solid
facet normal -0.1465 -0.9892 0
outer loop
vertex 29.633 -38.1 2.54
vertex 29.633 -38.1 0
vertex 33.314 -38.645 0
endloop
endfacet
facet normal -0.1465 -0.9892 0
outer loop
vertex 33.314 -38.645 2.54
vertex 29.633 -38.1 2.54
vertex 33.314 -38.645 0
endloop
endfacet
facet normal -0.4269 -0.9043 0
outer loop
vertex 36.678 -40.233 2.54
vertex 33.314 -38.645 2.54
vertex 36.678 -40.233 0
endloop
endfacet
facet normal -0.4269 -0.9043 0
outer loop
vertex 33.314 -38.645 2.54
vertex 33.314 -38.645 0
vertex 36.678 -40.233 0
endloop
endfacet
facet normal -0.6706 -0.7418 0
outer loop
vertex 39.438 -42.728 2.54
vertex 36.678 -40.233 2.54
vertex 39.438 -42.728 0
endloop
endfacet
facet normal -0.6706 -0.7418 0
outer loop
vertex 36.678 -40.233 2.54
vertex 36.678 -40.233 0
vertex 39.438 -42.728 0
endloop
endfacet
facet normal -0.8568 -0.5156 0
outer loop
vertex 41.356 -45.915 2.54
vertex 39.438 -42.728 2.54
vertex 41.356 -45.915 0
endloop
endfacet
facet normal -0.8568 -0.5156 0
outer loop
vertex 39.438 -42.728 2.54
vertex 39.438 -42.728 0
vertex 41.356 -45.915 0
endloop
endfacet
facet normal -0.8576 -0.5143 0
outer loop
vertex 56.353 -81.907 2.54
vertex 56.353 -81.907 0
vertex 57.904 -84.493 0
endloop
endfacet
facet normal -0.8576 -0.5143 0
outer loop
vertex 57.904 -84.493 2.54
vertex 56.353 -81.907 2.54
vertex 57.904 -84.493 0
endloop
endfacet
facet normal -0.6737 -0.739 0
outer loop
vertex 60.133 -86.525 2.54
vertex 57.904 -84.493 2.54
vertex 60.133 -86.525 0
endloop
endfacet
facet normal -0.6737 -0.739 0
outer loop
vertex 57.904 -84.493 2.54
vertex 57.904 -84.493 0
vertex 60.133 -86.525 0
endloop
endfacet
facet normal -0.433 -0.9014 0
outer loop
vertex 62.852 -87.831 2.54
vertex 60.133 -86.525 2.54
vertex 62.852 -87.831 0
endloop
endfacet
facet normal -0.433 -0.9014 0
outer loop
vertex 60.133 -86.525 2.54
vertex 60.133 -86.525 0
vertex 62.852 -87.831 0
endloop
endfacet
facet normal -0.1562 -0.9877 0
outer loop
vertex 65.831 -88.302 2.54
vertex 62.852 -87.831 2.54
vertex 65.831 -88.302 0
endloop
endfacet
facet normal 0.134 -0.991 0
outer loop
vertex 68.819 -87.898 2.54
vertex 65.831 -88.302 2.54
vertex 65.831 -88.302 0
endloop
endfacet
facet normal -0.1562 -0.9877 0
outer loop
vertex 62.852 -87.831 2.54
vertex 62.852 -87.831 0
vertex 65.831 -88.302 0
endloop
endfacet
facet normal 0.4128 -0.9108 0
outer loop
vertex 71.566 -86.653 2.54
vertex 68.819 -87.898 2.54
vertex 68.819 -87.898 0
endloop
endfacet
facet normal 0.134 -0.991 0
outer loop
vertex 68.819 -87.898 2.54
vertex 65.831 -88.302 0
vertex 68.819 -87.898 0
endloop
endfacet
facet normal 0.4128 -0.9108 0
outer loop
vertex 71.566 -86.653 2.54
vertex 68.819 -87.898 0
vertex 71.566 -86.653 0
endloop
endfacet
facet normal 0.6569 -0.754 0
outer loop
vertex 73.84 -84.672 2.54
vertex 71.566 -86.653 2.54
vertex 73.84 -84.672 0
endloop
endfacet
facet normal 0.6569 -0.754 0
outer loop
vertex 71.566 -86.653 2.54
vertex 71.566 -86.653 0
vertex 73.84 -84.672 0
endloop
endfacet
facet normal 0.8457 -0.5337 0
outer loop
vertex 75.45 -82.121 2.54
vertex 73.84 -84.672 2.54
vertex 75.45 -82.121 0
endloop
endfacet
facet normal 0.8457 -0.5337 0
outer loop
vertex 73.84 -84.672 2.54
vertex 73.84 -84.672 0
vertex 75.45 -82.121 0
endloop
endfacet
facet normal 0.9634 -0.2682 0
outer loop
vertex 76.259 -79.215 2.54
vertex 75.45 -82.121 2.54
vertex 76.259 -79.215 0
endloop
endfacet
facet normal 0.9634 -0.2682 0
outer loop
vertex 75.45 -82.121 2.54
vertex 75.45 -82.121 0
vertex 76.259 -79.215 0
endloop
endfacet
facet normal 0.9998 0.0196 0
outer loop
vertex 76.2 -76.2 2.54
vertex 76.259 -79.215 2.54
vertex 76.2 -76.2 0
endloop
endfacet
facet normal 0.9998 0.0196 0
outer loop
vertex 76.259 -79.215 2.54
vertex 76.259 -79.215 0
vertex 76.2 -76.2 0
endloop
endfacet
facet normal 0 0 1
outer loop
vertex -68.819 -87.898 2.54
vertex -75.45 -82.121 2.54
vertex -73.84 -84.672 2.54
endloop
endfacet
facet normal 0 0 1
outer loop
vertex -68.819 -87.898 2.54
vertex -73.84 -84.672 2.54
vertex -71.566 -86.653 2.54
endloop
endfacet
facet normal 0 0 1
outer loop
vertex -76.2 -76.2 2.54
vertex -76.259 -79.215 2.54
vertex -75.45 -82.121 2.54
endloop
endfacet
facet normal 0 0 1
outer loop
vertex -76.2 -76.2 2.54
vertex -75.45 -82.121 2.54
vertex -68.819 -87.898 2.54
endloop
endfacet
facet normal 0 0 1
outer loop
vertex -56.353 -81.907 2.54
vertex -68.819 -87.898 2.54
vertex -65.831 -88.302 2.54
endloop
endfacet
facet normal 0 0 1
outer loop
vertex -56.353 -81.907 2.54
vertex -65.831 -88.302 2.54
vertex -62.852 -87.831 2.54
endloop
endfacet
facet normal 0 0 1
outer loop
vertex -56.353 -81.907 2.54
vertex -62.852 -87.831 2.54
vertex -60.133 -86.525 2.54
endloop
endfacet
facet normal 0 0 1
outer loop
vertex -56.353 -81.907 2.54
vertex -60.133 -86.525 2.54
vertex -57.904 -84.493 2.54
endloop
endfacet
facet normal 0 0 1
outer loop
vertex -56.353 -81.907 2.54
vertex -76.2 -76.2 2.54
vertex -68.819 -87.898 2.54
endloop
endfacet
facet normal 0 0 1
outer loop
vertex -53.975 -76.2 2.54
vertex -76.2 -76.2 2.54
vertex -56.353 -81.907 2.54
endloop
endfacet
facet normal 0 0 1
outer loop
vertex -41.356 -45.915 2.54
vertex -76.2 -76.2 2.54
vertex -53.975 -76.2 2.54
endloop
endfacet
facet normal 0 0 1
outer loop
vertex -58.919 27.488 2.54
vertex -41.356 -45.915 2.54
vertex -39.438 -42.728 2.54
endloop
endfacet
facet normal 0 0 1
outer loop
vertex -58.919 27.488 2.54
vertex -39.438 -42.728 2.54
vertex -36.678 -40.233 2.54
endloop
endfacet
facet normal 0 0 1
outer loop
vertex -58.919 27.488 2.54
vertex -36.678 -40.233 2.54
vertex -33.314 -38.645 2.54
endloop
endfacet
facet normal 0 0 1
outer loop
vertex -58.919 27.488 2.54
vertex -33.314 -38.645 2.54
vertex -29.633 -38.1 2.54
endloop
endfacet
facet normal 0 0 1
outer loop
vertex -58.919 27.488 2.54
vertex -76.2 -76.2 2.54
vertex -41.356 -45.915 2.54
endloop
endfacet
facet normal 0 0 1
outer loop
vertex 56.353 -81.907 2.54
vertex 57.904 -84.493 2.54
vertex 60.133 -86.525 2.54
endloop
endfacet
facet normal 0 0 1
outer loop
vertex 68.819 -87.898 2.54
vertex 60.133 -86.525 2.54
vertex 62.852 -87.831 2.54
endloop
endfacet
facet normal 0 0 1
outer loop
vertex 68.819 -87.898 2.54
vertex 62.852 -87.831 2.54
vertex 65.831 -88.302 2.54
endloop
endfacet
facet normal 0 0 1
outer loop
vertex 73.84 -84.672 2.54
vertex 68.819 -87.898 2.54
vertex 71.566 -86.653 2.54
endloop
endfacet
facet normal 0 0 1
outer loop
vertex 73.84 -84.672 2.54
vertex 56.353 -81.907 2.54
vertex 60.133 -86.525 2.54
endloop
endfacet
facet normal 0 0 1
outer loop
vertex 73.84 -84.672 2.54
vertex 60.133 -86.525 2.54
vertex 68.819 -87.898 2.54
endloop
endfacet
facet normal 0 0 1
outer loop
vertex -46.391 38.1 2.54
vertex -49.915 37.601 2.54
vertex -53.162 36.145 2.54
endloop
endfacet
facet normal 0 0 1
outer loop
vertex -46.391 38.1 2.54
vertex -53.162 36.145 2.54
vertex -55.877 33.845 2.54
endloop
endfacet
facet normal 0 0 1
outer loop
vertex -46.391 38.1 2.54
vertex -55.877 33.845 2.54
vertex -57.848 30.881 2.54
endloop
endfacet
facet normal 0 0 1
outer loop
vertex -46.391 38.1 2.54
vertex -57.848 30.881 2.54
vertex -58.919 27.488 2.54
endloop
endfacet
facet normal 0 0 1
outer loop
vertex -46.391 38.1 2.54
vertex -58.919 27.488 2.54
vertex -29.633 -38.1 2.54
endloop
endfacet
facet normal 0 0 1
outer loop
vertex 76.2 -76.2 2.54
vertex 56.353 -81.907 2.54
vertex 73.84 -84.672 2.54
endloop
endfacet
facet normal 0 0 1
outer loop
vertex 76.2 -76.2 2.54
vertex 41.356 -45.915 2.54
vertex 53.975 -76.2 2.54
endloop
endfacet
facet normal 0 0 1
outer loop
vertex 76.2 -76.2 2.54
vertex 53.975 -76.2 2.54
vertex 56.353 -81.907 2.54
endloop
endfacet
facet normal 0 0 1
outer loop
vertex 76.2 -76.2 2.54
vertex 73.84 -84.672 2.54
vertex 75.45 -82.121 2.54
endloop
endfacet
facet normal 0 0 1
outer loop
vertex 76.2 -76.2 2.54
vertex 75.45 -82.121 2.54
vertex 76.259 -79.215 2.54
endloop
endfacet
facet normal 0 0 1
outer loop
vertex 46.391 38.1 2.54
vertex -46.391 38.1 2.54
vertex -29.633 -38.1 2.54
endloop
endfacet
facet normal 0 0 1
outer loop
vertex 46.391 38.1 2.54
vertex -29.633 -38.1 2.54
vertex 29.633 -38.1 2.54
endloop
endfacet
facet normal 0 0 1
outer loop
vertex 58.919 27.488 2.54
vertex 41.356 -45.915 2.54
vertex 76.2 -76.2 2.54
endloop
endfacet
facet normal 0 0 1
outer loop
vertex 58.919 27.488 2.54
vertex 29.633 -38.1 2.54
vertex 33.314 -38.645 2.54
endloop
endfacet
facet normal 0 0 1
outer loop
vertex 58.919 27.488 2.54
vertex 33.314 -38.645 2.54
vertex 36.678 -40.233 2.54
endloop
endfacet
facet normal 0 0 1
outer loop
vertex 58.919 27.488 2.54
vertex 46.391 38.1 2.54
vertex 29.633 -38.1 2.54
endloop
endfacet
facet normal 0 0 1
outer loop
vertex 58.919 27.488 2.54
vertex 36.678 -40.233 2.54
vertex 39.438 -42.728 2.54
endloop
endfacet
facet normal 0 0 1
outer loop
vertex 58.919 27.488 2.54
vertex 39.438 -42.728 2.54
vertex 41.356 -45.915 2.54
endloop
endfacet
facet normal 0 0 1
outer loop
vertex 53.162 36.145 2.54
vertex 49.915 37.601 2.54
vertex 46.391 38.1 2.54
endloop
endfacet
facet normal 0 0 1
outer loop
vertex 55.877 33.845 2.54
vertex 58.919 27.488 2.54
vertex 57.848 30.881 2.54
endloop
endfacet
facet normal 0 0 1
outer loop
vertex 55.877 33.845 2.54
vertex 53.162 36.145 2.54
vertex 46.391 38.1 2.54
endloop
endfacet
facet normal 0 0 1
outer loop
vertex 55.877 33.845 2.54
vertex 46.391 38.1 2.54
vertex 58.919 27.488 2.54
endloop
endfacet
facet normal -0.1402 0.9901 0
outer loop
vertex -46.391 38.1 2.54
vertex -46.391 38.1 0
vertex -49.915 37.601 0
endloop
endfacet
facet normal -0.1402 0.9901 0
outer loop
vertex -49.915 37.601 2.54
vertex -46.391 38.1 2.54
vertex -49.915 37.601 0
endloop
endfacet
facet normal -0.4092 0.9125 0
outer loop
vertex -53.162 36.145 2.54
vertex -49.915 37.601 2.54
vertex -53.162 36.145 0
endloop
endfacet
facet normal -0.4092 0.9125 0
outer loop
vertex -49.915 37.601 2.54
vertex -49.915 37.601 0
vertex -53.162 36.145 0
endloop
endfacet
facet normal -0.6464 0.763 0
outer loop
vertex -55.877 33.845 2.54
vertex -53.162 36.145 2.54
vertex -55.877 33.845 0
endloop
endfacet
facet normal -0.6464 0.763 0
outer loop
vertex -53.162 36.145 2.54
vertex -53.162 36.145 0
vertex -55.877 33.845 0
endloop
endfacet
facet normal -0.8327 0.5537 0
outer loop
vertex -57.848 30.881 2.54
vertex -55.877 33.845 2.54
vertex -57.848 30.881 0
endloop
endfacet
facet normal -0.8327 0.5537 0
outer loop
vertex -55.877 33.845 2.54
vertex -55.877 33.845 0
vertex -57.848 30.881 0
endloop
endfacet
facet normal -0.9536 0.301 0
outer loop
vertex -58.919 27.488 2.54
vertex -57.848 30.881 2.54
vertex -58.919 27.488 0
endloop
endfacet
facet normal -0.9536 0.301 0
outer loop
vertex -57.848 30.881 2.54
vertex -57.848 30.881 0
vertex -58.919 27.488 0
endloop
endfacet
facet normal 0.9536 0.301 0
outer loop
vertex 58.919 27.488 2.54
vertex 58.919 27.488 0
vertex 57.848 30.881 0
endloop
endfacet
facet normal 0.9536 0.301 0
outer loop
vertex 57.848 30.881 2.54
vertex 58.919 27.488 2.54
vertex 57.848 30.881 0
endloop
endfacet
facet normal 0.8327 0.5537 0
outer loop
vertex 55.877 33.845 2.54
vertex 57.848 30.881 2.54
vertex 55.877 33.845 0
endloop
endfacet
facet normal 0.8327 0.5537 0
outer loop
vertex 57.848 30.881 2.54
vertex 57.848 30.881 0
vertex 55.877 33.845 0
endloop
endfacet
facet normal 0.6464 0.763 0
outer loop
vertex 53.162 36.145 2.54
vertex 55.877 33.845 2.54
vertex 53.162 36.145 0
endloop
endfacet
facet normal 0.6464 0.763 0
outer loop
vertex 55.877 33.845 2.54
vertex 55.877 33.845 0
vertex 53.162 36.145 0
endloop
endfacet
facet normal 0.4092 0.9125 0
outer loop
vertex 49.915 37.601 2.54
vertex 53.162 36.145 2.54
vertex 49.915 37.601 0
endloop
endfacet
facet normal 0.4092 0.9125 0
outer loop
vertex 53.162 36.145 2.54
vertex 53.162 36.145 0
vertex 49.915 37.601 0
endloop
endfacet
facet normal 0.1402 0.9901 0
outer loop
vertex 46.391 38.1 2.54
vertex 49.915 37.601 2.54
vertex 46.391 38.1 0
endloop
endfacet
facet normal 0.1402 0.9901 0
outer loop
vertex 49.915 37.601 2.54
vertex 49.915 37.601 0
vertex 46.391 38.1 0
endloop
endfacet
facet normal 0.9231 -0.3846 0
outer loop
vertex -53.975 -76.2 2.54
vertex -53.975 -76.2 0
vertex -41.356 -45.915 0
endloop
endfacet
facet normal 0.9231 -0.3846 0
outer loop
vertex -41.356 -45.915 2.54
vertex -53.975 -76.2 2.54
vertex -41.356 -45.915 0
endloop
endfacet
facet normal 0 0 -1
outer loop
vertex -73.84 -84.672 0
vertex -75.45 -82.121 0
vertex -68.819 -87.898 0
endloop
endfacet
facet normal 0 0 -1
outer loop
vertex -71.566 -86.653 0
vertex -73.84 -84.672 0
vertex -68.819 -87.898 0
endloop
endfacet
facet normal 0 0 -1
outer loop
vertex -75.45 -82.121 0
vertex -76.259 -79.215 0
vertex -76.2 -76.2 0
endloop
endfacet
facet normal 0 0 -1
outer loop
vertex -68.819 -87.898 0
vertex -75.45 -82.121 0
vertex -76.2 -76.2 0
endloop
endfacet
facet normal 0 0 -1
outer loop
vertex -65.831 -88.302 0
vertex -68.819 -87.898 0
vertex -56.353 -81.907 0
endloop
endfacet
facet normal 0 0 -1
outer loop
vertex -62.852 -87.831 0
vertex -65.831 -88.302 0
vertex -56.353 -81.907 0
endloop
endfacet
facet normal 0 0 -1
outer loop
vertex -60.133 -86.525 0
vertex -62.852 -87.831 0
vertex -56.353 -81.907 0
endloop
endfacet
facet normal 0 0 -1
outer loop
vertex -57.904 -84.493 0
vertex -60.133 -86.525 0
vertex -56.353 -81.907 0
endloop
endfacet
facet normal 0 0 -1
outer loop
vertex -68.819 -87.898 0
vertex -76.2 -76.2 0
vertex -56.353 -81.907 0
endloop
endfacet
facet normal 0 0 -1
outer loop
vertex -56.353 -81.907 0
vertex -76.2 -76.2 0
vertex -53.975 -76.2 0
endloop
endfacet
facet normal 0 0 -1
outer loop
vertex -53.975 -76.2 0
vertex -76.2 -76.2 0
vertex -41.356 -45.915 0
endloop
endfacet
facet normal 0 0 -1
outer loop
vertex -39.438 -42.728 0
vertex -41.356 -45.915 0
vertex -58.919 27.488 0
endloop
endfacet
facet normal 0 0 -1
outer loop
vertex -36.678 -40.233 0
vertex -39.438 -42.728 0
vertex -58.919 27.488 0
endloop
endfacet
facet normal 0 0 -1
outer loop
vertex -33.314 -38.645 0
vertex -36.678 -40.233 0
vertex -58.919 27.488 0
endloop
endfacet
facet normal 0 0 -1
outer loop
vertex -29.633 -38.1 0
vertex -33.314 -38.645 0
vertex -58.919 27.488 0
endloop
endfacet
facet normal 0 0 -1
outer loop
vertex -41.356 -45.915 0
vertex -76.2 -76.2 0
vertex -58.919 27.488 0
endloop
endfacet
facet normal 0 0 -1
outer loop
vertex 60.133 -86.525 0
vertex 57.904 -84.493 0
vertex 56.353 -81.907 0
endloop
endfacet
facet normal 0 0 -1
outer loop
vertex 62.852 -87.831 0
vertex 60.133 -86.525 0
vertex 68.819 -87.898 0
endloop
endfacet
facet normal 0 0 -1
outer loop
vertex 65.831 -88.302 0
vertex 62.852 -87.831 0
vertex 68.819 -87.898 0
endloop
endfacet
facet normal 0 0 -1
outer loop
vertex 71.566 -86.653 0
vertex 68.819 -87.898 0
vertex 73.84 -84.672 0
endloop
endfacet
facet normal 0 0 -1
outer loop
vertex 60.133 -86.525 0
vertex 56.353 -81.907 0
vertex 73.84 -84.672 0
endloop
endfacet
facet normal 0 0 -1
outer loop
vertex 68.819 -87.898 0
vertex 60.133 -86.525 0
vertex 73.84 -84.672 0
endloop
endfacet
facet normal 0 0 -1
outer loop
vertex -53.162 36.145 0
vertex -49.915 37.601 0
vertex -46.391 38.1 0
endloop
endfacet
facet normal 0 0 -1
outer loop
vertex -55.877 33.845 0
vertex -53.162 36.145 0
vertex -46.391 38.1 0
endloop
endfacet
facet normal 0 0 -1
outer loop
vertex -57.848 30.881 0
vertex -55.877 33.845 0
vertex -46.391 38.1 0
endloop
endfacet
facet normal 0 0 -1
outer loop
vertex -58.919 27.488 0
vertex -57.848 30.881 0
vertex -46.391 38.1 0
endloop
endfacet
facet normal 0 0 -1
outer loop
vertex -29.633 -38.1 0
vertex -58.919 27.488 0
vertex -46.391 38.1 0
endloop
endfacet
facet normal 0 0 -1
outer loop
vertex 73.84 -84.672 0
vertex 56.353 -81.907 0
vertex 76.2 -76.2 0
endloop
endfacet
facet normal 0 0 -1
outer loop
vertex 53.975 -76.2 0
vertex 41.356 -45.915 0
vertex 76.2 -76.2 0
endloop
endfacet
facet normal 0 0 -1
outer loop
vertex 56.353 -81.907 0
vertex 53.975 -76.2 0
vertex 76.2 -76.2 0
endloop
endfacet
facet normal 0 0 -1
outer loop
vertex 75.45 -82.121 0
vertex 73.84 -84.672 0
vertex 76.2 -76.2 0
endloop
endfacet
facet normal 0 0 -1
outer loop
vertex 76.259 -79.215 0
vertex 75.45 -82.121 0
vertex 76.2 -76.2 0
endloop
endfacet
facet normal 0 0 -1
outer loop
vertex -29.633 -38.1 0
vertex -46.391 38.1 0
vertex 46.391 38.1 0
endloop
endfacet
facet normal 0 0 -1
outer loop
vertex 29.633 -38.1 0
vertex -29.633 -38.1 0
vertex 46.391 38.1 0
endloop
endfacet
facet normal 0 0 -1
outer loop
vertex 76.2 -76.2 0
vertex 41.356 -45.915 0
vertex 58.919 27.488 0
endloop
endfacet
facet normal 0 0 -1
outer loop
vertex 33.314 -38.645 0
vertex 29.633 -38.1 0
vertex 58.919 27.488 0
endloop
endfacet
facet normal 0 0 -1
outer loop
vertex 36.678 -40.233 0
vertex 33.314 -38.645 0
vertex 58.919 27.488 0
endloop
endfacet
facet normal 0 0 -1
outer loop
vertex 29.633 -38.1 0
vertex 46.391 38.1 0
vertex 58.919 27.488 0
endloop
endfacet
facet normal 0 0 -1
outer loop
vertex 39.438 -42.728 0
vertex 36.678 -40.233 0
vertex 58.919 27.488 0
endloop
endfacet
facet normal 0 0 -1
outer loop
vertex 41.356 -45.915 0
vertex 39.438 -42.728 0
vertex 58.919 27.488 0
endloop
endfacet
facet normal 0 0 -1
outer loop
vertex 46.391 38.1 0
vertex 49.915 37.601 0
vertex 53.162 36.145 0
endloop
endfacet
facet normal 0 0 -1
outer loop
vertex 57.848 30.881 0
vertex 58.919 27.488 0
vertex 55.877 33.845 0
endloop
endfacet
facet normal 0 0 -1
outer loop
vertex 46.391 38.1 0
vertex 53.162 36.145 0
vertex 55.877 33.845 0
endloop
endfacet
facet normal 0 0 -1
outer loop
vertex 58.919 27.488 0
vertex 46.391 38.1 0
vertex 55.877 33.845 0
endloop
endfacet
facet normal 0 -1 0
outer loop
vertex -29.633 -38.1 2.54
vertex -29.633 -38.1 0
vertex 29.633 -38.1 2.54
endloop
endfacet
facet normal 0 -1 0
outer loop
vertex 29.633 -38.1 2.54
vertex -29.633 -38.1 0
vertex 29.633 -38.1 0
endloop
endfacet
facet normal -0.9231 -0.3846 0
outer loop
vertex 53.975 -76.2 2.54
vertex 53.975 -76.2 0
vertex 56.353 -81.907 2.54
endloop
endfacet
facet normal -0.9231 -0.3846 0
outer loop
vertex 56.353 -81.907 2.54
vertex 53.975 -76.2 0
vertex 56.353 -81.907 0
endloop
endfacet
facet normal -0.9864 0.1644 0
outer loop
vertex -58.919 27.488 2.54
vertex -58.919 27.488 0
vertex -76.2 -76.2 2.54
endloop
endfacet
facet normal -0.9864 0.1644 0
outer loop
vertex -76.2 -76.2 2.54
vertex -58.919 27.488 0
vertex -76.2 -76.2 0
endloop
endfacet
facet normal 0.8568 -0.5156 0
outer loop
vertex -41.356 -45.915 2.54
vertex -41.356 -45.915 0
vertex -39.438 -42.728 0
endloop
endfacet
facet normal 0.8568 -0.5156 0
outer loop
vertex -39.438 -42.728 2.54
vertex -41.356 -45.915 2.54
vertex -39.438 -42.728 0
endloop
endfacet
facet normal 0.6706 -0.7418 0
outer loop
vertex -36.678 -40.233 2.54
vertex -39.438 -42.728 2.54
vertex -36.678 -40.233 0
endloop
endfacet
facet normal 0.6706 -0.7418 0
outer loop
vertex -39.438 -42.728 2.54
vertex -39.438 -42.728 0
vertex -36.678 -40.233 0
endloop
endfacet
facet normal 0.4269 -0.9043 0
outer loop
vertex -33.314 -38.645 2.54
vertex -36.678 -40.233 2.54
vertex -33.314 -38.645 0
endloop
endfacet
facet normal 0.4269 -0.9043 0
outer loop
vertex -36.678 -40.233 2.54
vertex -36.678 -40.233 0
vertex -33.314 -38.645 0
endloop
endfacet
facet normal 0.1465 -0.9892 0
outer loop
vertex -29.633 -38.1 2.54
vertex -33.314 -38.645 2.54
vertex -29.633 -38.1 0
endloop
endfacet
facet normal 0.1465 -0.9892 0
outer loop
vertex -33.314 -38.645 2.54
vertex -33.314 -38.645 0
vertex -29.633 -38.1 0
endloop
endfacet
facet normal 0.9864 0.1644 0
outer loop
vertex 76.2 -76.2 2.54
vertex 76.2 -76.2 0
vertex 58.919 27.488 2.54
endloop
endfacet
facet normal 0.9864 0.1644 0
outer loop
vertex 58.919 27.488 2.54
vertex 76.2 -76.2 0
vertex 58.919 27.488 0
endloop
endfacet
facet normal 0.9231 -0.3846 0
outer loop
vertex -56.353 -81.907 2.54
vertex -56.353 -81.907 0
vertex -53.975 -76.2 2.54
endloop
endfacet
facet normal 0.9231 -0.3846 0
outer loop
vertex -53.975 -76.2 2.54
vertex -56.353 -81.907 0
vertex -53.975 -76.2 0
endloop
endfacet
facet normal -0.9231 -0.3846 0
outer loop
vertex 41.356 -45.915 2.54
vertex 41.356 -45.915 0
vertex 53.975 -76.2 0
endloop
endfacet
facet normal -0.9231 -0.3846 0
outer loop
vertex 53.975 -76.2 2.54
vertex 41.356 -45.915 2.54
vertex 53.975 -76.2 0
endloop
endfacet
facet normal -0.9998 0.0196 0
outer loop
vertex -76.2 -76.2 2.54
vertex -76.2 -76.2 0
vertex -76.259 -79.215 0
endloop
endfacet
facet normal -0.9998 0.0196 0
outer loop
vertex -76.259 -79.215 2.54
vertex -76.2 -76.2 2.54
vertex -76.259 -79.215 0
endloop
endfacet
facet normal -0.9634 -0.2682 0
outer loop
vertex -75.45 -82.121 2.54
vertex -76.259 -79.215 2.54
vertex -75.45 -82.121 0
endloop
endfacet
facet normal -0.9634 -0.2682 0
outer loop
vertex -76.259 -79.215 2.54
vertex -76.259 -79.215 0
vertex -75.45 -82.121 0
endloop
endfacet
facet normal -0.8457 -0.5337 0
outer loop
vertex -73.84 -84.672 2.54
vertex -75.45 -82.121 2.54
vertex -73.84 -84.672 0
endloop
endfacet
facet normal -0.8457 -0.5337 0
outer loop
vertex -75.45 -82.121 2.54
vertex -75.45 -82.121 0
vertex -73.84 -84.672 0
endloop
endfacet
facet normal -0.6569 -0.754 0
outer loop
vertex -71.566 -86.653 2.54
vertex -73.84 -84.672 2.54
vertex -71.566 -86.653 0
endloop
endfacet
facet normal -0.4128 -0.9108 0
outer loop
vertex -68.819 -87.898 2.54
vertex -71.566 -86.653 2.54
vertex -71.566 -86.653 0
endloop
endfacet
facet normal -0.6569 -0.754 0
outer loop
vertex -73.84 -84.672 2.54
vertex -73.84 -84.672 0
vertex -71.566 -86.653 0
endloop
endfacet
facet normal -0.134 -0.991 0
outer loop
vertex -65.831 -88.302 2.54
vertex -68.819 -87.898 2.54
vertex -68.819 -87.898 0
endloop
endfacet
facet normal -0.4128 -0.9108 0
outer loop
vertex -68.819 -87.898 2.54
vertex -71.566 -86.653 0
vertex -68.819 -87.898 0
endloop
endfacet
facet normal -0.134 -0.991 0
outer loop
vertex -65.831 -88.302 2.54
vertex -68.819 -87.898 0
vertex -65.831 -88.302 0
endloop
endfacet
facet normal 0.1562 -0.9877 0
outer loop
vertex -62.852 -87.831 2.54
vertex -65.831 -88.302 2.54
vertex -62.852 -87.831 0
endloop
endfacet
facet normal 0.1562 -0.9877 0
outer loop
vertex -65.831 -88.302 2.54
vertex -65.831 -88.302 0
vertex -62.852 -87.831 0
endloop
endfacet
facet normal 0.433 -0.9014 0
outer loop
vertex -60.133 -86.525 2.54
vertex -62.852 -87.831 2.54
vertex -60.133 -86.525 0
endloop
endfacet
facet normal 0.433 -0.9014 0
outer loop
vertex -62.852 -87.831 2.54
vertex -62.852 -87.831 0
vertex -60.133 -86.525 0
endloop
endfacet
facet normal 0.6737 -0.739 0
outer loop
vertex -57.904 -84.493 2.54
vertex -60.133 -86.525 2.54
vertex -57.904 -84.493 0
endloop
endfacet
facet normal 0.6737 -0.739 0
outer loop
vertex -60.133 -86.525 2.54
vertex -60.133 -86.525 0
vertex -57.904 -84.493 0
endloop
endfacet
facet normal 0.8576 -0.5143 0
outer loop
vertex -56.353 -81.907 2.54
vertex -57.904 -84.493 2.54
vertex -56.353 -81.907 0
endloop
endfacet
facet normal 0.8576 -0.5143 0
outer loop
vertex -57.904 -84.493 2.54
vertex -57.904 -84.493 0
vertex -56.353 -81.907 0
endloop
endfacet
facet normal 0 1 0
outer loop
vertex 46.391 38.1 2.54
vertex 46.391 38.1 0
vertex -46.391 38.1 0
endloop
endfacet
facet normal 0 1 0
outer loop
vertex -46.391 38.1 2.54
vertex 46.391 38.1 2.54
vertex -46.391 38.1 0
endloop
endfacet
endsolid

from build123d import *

# Parameters (mm, degrees)
BOSS_EXTRUDE1_DEPTH = 2.54


with BuildPart() as part:
    # Sketch1 → Boss-Extrude1 (new body)
    with BuildSketch(Plane.XY):
        with BuildLine():
            Line((-58.91868881, 27.487867139), (-76.2, -76.2))
            ThreePointArc((-76.2, -76.2), (-68.819471722, -87.89820202), (-56.352718657, -81.906524778))
            Line((-56.352718657, -81.906524778), (-53.975, -76.2))
            Line((-53.975, -76.2), (-41.356410256, -45.915384615))
            ThreePointArc((-41.356410256, -45.915384615), (-36.678025825, -40.232961262), (-29.633333333, -38.1))
            Line((-29.633333333, -38.1), (29.633333333, -38.1))
            ThreePointArc((29.633333333, -38.1), (36.678025825, -40.232961262), (41.356410256, -45.915384615))
            Line((41.356410256, -45.915384615), (53.975, -76.2))
            Line((53.975, -76.2), (56.352718657, -81.906524778))
            ThreePointArc((56.352718657, -81.906524778), (68.819471722, -87.89820202), (76.2, -76.2))
            Line((76.2, -76.2), (58.91868881, 27.487867139))
            ThreePointArc((58.91868881, 27.487867139), (54.600447158, 35.090353777), (46.391485978, 38.1))
            Line((46.391485978, 38.1), (-46.391485978, 38.1))
            ThreePointArc((-46.391485978, 38.1), (-54.600447158, 35.090353777), (-58.91868881, 27.487867139))
        make_face()
    extrude(amount=BOSS_EXTRUDE1_DEPTH)


solid = part.part
